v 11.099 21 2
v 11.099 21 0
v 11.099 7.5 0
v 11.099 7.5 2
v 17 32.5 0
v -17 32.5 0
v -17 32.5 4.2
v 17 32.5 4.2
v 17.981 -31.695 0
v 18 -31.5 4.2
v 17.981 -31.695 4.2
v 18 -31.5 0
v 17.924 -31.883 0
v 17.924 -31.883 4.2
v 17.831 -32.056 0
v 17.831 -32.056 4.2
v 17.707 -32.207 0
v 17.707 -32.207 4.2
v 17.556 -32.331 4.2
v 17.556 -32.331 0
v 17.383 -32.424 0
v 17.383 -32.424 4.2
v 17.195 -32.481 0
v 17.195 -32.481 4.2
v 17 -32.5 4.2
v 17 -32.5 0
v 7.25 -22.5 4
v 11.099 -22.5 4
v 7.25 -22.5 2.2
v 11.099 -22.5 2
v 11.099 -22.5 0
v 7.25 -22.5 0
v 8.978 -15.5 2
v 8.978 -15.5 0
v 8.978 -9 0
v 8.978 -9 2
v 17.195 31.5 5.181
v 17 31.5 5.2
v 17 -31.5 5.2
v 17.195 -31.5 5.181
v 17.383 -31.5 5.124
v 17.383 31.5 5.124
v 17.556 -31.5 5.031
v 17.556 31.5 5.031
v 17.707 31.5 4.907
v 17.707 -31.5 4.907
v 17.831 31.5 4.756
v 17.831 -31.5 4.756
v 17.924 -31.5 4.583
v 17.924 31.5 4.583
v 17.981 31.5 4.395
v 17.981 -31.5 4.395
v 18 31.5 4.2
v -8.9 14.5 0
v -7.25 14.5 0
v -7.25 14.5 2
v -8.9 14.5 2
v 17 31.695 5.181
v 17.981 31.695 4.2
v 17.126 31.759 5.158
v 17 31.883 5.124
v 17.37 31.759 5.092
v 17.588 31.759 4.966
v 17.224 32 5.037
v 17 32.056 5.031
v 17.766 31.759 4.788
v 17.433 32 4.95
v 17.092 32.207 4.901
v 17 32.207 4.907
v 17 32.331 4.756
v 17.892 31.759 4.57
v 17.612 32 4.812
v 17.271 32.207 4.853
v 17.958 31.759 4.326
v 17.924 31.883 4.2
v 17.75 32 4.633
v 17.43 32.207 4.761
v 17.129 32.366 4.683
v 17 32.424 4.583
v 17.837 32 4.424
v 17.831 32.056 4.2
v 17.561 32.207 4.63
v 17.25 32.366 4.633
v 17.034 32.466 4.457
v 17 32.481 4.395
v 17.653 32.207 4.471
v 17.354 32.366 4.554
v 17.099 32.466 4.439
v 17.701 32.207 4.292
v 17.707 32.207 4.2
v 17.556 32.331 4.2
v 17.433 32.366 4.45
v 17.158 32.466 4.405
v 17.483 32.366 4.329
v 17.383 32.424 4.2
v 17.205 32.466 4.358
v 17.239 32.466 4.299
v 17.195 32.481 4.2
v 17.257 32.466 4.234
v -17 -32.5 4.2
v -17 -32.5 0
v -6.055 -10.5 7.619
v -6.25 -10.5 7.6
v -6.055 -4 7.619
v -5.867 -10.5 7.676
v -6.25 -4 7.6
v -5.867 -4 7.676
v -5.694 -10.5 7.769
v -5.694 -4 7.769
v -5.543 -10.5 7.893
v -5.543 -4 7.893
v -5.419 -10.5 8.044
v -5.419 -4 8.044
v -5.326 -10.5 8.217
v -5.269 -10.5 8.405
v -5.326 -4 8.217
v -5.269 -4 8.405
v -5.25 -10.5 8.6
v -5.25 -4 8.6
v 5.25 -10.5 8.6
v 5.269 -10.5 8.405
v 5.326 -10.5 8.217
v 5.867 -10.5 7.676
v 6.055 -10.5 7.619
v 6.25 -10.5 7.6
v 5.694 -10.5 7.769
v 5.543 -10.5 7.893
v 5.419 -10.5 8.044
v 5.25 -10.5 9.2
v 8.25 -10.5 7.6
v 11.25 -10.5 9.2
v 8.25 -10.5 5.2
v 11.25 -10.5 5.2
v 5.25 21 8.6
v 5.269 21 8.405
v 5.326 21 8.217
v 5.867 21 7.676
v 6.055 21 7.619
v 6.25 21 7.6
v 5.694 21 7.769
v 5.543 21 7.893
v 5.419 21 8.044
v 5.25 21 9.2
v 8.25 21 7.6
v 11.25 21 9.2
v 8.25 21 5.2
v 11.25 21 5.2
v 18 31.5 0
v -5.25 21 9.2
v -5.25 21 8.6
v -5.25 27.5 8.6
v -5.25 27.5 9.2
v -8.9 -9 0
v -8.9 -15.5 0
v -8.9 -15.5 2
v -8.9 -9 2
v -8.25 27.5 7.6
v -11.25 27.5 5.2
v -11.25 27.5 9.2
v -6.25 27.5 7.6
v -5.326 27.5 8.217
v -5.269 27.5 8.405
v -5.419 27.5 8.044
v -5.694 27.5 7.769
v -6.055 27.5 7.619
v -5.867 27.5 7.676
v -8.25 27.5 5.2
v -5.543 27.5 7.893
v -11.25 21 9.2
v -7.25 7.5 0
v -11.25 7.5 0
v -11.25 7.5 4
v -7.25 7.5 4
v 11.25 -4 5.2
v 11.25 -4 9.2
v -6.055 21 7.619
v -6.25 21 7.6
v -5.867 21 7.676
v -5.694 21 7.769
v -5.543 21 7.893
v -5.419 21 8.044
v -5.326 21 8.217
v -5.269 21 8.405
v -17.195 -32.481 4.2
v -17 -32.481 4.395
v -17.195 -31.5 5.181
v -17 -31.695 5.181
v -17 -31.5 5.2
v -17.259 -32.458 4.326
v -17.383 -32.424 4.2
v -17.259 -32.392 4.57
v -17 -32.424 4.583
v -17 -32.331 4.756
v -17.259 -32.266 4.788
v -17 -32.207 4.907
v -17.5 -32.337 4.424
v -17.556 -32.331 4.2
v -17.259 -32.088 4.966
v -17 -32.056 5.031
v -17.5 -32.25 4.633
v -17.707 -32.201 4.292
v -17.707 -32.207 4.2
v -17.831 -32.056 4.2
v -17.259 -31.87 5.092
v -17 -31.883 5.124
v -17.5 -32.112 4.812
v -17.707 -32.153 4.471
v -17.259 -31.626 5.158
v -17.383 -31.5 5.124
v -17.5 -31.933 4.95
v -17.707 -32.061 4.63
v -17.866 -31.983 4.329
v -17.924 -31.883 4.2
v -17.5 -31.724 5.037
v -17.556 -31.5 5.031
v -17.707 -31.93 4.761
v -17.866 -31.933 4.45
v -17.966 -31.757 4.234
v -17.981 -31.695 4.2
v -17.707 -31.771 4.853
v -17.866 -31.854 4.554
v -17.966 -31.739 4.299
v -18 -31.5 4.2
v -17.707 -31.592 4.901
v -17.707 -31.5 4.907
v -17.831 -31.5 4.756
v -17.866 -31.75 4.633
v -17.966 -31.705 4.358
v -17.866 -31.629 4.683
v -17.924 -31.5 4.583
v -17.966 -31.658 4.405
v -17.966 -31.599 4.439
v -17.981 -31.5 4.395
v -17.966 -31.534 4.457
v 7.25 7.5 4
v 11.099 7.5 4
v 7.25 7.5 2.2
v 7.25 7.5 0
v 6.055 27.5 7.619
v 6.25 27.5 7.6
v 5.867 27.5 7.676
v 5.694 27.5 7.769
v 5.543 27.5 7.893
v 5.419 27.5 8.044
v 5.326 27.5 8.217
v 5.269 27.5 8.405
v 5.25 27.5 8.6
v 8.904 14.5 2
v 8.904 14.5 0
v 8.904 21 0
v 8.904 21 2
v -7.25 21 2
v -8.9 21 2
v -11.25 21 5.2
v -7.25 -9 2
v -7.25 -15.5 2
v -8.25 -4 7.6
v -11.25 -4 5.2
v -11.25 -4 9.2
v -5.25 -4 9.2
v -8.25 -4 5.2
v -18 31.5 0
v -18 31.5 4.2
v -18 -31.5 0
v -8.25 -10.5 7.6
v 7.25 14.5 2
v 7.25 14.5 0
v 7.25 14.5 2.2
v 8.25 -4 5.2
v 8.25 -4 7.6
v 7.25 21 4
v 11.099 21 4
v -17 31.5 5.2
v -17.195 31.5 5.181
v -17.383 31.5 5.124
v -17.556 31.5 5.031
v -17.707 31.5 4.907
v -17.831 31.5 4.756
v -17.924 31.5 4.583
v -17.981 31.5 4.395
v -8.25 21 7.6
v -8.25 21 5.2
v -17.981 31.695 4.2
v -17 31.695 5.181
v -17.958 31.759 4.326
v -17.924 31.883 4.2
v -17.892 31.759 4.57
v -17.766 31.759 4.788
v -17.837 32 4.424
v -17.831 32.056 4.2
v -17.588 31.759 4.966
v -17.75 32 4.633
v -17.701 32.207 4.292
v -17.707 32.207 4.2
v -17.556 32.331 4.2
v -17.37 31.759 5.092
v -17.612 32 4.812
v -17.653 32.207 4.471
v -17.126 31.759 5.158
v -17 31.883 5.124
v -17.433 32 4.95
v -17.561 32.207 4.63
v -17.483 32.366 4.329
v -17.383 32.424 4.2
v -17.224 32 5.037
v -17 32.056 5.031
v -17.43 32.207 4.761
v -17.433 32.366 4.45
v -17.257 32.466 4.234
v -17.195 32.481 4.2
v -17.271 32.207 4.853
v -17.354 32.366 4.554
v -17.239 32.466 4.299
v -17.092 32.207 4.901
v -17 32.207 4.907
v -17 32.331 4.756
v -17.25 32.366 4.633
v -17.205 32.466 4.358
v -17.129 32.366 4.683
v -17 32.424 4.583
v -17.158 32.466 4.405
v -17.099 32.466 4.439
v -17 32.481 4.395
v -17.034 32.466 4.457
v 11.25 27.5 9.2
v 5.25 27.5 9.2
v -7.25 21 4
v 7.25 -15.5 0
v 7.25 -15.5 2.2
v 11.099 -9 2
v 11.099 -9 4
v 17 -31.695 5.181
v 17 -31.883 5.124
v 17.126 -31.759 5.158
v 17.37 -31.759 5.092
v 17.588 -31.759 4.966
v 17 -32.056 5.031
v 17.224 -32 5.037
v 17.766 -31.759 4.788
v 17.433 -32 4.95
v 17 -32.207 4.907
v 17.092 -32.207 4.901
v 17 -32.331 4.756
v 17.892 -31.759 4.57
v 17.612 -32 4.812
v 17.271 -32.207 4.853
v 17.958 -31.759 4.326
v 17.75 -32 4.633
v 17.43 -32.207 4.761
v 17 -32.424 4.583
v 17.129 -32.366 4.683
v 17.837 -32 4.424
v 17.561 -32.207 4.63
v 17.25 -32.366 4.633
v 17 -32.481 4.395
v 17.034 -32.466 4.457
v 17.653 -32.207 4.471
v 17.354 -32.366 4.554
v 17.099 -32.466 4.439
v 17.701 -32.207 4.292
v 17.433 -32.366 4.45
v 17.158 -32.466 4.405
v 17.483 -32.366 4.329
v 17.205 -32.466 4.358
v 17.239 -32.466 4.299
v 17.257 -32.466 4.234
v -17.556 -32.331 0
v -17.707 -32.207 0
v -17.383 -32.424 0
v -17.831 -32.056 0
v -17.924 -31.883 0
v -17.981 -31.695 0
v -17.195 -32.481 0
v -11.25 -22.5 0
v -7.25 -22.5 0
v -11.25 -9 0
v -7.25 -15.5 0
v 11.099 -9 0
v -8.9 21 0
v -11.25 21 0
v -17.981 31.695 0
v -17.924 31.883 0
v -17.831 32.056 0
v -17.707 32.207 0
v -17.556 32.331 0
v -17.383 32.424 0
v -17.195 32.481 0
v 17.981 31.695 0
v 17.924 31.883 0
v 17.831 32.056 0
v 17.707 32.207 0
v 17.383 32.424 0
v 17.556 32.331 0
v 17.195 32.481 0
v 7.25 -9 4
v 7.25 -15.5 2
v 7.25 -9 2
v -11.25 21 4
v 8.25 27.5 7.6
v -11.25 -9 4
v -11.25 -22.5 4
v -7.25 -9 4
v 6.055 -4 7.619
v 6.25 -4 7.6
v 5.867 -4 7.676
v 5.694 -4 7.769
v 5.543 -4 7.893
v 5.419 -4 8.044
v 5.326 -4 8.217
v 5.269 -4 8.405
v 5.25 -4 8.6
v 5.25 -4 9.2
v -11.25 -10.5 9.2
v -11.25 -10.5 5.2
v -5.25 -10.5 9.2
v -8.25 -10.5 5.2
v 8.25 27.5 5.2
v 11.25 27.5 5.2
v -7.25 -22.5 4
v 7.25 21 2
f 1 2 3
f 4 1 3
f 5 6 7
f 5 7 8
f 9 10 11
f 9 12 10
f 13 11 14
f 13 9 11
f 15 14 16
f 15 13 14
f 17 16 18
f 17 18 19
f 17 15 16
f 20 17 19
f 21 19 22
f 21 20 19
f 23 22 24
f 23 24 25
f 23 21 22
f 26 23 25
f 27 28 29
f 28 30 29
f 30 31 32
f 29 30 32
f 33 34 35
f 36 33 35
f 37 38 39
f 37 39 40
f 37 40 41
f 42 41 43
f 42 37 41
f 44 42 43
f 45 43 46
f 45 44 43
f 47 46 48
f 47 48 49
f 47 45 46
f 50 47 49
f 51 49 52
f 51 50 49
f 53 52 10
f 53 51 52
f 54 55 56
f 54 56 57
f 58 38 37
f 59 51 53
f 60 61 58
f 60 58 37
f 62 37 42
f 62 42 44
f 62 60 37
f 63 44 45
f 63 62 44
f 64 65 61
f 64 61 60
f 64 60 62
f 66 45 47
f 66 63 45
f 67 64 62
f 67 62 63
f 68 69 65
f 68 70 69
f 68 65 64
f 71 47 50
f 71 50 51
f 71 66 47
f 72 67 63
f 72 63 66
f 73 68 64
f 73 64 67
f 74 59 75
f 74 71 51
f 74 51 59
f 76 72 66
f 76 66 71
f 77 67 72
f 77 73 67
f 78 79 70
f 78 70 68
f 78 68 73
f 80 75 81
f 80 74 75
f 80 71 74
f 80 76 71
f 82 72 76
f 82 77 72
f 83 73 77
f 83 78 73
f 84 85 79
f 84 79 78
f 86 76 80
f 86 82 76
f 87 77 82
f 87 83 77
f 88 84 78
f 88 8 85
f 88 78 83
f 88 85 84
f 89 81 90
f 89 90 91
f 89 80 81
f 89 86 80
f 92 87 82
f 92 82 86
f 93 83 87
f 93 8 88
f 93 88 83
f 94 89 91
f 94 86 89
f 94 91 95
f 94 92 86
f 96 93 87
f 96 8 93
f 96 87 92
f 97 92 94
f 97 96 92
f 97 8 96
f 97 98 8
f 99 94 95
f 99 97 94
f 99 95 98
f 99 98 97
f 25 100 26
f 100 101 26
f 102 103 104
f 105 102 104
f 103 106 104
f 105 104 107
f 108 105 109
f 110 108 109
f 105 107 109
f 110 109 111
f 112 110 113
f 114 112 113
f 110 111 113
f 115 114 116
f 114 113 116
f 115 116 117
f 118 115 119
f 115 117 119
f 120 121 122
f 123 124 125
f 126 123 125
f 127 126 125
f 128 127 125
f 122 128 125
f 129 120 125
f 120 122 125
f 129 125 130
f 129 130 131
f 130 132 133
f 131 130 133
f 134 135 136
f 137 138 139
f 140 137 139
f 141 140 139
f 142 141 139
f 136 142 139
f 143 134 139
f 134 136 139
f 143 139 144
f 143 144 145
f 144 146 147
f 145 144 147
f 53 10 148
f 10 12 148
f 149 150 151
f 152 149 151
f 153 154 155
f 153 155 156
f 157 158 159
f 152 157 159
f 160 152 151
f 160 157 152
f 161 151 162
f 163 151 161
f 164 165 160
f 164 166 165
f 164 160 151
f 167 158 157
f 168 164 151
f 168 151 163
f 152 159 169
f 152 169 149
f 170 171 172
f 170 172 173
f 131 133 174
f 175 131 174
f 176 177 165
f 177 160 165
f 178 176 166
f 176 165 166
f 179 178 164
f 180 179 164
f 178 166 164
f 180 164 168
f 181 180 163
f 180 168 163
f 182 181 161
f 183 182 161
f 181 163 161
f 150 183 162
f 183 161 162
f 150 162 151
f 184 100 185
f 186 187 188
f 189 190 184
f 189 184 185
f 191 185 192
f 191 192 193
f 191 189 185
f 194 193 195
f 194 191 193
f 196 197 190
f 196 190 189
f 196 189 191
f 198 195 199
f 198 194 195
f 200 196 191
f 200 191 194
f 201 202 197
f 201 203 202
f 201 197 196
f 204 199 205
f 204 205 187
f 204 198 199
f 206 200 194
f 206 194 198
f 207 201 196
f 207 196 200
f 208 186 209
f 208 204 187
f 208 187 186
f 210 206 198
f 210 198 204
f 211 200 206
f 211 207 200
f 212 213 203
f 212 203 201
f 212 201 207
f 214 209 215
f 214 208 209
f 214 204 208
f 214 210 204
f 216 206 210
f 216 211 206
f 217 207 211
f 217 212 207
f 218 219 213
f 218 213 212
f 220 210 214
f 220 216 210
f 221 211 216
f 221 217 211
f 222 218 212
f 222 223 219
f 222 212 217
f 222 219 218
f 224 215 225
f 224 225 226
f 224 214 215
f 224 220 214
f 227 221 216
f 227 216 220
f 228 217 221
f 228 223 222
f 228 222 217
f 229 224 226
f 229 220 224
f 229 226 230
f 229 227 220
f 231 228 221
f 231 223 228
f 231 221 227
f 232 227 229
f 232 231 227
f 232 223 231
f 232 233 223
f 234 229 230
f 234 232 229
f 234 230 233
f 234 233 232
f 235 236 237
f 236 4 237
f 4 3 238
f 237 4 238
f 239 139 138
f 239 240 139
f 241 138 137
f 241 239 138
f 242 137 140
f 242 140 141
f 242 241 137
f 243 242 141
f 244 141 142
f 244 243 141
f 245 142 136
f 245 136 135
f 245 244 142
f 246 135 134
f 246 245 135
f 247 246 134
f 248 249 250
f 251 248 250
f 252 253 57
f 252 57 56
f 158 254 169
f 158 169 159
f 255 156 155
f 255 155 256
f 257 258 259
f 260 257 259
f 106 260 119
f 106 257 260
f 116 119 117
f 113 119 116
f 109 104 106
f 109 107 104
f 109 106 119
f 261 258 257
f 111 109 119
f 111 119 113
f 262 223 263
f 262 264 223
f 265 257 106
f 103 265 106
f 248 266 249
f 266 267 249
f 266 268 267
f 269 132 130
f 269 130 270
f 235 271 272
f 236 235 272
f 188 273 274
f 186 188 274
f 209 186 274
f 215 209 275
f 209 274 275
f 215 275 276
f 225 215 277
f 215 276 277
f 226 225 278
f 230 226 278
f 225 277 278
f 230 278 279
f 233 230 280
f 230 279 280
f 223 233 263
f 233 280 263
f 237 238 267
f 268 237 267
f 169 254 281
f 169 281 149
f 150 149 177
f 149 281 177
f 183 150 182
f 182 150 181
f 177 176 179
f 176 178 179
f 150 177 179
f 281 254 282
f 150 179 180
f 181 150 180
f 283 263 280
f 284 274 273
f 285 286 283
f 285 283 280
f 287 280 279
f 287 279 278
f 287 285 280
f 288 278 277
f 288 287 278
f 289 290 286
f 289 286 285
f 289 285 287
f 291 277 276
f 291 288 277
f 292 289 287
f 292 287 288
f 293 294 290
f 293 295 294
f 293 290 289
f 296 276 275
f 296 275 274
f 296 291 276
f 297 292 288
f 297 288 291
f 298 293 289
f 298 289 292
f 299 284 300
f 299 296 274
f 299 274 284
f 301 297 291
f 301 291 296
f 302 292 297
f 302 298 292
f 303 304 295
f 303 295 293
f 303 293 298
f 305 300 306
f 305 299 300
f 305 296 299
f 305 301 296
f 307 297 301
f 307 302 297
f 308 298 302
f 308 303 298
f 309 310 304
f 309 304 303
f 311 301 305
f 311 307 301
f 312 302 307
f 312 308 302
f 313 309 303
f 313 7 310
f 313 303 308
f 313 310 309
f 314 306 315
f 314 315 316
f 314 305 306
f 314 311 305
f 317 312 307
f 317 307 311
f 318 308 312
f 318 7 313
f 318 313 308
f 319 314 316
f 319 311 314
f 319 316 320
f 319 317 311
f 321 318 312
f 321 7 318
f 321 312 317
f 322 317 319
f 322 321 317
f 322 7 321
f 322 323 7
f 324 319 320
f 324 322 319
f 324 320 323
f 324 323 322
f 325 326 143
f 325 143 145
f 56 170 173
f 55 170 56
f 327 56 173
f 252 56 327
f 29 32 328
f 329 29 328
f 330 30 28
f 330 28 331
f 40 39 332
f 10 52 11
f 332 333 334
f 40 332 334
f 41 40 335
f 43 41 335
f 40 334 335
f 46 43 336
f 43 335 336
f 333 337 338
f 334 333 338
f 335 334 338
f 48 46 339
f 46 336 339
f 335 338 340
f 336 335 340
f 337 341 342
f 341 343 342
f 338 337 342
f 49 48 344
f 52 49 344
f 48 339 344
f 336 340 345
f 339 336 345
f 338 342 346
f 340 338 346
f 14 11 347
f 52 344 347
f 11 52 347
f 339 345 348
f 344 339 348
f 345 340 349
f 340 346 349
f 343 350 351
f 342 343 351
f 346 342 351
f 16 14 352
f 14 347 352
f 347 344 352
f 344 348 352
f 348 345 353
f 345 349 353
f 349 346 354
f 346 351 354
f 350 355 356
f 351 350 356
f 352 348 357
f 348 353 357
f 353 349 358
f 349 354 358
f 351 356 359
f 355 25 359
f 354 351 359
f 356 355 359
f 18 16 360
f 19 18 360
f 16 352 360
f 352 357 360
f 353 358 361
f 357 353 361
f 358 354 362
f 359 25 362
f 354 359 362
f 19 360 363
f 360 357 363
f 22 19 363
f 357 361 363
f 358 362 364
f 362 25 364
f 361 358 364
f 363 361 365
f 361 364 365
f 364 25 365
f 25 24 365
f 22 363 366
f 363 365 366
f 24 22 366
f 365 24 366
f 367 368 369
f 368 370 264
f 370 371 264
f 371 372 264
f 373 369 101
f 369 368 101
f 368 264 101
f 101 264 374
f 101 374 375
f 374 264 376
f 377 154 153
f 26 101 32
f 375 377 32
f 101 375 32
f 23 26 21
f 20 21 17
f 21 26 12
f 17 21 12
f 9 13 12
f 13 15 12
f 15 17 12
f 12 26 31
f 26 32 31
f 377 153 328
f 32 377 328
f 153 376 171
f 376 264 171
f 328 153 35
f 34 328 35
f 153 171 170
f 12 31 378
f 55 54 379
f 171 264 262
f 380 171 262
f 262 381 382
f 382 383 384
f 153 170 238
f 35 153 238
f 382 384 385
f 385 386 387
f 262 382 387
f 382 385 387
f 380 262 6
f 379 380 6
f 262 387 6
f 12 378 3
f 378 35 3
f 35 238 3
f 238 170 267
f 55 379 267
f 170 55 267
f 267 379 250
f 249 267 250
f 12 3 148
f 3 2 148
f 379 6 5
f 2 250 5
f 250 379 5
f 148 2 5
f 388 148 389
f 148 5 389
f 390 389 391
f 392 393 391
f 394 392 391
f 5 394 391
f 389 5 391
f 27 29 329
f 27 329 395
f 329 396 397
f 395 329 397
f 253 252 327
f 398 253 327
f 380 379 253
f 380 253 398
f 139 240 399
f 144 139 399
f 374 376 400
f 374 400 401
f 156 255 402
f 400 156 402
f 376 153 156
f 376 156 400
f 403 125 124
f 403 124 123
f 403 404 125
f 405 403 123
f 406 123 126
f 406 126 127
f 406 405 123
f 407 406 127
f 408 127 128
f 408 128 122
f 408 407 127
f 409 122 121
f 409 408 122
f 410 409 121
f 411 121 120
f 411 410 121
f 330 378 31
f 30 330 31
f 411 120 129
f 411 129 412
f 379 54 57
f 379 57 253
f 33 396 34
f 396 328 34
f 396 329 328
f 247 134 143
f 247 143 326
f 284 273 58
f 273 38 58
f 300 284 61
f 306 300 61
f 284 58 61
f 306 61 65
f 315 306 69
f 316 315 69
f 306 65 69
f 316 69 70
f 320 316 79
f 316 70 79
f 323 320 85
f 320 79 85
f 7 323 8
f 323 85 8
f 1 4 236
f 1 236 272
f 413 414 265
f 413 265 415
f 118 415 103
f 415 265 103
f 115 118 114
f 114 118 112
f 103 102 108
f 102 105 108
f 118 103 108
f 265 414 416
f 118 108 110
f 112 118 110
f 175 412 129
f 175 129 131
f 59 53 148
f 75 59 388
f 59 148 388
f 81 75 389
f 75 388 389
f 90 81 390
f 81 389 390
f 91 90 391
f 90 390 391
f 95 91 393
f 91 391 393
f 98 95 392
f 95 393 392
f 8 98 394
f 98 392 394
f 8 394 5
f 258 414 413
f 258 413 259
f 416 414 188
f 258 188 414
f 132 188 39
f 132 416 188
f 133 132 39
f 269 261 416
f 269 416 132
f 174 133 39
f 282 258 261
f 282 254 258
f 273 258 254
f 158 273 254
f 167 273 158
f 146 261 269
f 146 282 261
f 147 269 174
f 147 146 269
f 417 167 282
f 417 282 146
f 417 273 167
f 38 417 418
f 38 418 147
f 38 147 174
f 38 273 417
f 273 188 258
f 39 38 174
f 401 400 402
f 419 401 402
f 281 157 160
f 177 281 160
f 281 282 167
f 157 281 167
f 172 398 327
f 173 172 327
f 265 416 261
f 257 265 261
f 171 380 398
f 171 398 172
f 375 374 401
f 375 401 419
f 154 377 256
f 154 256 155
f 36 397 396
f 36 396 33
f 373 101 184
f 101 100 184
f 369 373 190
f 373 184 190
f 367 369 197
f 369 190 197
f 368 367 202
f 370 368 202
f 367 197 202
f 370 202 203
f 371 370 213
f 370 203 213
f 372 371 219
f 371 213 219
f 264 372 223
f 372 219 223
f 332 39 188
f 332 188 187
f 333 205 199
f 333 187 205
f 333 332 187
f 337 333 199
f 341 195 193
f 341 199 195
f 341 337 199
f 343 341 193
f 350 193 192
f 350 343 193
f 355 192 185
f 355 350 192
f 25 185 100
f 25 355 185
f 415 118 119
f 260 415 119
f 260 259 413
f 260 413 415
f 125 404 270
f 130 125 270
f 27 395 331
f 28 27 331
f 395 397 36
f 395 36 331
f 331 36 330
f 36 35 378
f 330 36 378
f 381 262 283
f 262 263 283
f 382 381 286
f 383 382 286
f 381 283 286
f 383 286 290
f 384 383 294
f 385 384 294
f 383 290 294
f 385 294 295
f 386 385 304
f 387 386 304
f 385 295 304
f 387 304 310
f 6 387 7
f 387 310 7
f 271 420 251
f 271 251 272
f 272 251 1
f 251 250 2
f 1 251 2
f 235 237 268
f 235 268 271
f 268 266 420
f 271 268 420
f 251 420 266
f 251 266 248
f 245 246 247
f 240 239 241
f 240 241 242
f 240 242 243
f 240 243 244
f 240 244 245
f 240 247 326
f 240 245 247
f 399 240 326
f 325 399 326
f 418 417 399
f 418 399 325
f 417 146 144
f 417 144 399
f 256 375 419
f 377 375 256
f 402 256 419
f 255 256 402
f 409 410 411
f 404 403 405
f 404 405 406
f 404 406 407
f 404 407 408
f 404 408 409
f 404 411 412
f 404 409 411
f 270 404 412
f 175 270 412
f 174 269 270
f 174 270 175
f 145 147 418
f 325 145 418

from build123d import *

# Parameters (mm, degrees)
SKETCH_W        = 36
SKETCH_H        = 65
PAD_DEPTH       = 2.2
POCKET_DEPTH    = 2.201
SKETCH002_W     = 36
SKETCH002_H     = 65
PAD001_DEPTH    = 3
POCKET001_START = 2
SKETCH003_W     = 4
SKETCH003_H     = 13.5
SKETCH003_W_2   = 3.848829
POCKET001_DEPTH = 2
SKETCH004_W     = 6
SKETCH004_H     = 6.5
PAD002_DEPTH    = 4
SKETCH005_W     = 16.5
SKETCH005_H     = 38
POCKET002_DEPTH = 2.4
FILLET_R        = 1
FILLET001_R     = 1
FILLET002_R     = 1
FILLET003_R     = 1
FILLET004_R     = 1
FILLET005_R     = 1


with BuildPart() as part:
    # Sketch → Pad (new body)
    with BuildSketch(Plane.XY):
        Rectangle(SKETCH_W, SKETCH_H)
    extrude(amount=PAD_DEPTH)

    # Sketch001 → Pocket (cut, through all)
    with BuildSketch(Plane.XY):
        Polygon((-11.25, -9), (-11.25, -22.5), (-7.25, -22.5), (-7.25, -15.5), (-8.9, -15.5), (-8.9, -9), align=None)
        Polygon((-11.25, 21), (-11.25, 7.5), (-7.25, 7.5), (-7.25, 14.5), (-8.9, 14.5), (-8.9, 21), align=None)
        Polygon((11.098829, -9), (11.098829, -22.5), (7.25, -22.5), (7.25, -15.5), (8.977746, -15.5), (8.977746, -9), align=None)
        Polygon((11.098829, 21), (11.098829, 7.5), (7.25, 7.5), (7.25, 14.5), (8.903816, 14.5), (8.903816, 21), align=None)
    extrude(amount=POCKET_DEPTH, mode=Mode.SUBTRACT)

    # Sketch002 (on Face5 of Pocket) → Pad001 (join)
    with BuildSketch(Plane.XY.offset(2.2)):
        Rectangle(SKETCH002_W, SKETCH002_H)
    extrude(amount=PAD001_DEPTH)

    # Sketch003 → Pocket001 (cut)
    with BuildSketch(Plane.XY.offset(POCKET001_START)):
        with Locations((-9.25, 14.25)):
            Rectangle(SKETCH003_W, SKETCH003_H)
        with Locations((9.174415, 14.25)):
            Rectangle(SKETCH003_W_2, SKETCH003_H)
        with Locations((9.174415, -15.75)):
            Rectangle(SKETCH003_W_2, SKETCH003_H)
        with Locations((-9.25, -15.75)):
            Rectangle(SKETCH003_W, SKETCH003_H)
    extrude(amount=POCKET001_DEPTH, mode=Mode.SUBTRACT)

    # Sketch004 (on Face33 of Pocket001) → Pad002 (join)
    with BuildSketch(Plane.XY.offset(5.2)):
        with Locations((-8.25, 24.25)):
            Rectangle(SKETCH004_W, SKETCH004_H)
        with Locations((8.25, 24.25)):
            Rectangle(SKETCH004_W, SKETCH004_H)
        with Locations((-8.25, -7.25)):
            Rectangle(SKETCH004_W, SKETCH004_H)
        with Locations((8.25, -7.25)):
            Rectangle(SKETCH004_W, SKETCH004_H)
    extrude(amount=PAD002_DEPTH)

    # Sketch005 (on Face33 of Pad002) → Pocket002 (cut)
    with BuildSketch(Plane.XY.offset(5.2)):
        with Locations((0, 8.5)):
            Rectangle(SKETCH005_W, SKETCH005_H)
    extrude(amount=POCKET002_DEPTH, mode=Mode.SUBTRACT)

    # Fillet
    fillet_edges = [part.edges().sort_by_distance(p)[0] for p in [
        (18, 0, 5.2),
    ]]
    fillet(fillet_edges, radius=FILLET_R)

    # Fillet001
    fillet001_edges = [part.edges().sort_by_distance(p)[0] for p in [
        (-0.5, -32.5, 5.2),
    ]]
    fillet(fillet001_edges, radius=FILLET001_R)

    # Fillet002
    fillet002_edges = [part.edges().sort_by_distance(p)[0] for p in [
        (-18, 0.5, 5.2),
    ]]
    fillet(fillet002_edges, radius=FILLET002_R)

    # Fillet003
    fillet003_edges = [part.edges().sort_by_distance(p)[0] for p in [
        (0, 32.5, 5.2),
    ]]
    fillet(fillet003_edges, radius=FILLET003_R)

    # Fillet004
    fillet004_edges = [part.edges().sort_by_distance(p)[0] for p in [
        (5.25, -7.25, 7.6),
        (5.25, 24.25, 7.6),
    ]]
    fillet(fillet004_edges, radius=FILLET004_R)

    # Fillet005
    fillet005_edges = [part.edges().sort_by_distance(p)[0] for p in [
        (-5.25, 24.25, 7.6),
        (-5.25, -7.25, 7.6),
    ]]
    fillet(fillet005_edges, radius=FILLET005_R)


solid = part.part
